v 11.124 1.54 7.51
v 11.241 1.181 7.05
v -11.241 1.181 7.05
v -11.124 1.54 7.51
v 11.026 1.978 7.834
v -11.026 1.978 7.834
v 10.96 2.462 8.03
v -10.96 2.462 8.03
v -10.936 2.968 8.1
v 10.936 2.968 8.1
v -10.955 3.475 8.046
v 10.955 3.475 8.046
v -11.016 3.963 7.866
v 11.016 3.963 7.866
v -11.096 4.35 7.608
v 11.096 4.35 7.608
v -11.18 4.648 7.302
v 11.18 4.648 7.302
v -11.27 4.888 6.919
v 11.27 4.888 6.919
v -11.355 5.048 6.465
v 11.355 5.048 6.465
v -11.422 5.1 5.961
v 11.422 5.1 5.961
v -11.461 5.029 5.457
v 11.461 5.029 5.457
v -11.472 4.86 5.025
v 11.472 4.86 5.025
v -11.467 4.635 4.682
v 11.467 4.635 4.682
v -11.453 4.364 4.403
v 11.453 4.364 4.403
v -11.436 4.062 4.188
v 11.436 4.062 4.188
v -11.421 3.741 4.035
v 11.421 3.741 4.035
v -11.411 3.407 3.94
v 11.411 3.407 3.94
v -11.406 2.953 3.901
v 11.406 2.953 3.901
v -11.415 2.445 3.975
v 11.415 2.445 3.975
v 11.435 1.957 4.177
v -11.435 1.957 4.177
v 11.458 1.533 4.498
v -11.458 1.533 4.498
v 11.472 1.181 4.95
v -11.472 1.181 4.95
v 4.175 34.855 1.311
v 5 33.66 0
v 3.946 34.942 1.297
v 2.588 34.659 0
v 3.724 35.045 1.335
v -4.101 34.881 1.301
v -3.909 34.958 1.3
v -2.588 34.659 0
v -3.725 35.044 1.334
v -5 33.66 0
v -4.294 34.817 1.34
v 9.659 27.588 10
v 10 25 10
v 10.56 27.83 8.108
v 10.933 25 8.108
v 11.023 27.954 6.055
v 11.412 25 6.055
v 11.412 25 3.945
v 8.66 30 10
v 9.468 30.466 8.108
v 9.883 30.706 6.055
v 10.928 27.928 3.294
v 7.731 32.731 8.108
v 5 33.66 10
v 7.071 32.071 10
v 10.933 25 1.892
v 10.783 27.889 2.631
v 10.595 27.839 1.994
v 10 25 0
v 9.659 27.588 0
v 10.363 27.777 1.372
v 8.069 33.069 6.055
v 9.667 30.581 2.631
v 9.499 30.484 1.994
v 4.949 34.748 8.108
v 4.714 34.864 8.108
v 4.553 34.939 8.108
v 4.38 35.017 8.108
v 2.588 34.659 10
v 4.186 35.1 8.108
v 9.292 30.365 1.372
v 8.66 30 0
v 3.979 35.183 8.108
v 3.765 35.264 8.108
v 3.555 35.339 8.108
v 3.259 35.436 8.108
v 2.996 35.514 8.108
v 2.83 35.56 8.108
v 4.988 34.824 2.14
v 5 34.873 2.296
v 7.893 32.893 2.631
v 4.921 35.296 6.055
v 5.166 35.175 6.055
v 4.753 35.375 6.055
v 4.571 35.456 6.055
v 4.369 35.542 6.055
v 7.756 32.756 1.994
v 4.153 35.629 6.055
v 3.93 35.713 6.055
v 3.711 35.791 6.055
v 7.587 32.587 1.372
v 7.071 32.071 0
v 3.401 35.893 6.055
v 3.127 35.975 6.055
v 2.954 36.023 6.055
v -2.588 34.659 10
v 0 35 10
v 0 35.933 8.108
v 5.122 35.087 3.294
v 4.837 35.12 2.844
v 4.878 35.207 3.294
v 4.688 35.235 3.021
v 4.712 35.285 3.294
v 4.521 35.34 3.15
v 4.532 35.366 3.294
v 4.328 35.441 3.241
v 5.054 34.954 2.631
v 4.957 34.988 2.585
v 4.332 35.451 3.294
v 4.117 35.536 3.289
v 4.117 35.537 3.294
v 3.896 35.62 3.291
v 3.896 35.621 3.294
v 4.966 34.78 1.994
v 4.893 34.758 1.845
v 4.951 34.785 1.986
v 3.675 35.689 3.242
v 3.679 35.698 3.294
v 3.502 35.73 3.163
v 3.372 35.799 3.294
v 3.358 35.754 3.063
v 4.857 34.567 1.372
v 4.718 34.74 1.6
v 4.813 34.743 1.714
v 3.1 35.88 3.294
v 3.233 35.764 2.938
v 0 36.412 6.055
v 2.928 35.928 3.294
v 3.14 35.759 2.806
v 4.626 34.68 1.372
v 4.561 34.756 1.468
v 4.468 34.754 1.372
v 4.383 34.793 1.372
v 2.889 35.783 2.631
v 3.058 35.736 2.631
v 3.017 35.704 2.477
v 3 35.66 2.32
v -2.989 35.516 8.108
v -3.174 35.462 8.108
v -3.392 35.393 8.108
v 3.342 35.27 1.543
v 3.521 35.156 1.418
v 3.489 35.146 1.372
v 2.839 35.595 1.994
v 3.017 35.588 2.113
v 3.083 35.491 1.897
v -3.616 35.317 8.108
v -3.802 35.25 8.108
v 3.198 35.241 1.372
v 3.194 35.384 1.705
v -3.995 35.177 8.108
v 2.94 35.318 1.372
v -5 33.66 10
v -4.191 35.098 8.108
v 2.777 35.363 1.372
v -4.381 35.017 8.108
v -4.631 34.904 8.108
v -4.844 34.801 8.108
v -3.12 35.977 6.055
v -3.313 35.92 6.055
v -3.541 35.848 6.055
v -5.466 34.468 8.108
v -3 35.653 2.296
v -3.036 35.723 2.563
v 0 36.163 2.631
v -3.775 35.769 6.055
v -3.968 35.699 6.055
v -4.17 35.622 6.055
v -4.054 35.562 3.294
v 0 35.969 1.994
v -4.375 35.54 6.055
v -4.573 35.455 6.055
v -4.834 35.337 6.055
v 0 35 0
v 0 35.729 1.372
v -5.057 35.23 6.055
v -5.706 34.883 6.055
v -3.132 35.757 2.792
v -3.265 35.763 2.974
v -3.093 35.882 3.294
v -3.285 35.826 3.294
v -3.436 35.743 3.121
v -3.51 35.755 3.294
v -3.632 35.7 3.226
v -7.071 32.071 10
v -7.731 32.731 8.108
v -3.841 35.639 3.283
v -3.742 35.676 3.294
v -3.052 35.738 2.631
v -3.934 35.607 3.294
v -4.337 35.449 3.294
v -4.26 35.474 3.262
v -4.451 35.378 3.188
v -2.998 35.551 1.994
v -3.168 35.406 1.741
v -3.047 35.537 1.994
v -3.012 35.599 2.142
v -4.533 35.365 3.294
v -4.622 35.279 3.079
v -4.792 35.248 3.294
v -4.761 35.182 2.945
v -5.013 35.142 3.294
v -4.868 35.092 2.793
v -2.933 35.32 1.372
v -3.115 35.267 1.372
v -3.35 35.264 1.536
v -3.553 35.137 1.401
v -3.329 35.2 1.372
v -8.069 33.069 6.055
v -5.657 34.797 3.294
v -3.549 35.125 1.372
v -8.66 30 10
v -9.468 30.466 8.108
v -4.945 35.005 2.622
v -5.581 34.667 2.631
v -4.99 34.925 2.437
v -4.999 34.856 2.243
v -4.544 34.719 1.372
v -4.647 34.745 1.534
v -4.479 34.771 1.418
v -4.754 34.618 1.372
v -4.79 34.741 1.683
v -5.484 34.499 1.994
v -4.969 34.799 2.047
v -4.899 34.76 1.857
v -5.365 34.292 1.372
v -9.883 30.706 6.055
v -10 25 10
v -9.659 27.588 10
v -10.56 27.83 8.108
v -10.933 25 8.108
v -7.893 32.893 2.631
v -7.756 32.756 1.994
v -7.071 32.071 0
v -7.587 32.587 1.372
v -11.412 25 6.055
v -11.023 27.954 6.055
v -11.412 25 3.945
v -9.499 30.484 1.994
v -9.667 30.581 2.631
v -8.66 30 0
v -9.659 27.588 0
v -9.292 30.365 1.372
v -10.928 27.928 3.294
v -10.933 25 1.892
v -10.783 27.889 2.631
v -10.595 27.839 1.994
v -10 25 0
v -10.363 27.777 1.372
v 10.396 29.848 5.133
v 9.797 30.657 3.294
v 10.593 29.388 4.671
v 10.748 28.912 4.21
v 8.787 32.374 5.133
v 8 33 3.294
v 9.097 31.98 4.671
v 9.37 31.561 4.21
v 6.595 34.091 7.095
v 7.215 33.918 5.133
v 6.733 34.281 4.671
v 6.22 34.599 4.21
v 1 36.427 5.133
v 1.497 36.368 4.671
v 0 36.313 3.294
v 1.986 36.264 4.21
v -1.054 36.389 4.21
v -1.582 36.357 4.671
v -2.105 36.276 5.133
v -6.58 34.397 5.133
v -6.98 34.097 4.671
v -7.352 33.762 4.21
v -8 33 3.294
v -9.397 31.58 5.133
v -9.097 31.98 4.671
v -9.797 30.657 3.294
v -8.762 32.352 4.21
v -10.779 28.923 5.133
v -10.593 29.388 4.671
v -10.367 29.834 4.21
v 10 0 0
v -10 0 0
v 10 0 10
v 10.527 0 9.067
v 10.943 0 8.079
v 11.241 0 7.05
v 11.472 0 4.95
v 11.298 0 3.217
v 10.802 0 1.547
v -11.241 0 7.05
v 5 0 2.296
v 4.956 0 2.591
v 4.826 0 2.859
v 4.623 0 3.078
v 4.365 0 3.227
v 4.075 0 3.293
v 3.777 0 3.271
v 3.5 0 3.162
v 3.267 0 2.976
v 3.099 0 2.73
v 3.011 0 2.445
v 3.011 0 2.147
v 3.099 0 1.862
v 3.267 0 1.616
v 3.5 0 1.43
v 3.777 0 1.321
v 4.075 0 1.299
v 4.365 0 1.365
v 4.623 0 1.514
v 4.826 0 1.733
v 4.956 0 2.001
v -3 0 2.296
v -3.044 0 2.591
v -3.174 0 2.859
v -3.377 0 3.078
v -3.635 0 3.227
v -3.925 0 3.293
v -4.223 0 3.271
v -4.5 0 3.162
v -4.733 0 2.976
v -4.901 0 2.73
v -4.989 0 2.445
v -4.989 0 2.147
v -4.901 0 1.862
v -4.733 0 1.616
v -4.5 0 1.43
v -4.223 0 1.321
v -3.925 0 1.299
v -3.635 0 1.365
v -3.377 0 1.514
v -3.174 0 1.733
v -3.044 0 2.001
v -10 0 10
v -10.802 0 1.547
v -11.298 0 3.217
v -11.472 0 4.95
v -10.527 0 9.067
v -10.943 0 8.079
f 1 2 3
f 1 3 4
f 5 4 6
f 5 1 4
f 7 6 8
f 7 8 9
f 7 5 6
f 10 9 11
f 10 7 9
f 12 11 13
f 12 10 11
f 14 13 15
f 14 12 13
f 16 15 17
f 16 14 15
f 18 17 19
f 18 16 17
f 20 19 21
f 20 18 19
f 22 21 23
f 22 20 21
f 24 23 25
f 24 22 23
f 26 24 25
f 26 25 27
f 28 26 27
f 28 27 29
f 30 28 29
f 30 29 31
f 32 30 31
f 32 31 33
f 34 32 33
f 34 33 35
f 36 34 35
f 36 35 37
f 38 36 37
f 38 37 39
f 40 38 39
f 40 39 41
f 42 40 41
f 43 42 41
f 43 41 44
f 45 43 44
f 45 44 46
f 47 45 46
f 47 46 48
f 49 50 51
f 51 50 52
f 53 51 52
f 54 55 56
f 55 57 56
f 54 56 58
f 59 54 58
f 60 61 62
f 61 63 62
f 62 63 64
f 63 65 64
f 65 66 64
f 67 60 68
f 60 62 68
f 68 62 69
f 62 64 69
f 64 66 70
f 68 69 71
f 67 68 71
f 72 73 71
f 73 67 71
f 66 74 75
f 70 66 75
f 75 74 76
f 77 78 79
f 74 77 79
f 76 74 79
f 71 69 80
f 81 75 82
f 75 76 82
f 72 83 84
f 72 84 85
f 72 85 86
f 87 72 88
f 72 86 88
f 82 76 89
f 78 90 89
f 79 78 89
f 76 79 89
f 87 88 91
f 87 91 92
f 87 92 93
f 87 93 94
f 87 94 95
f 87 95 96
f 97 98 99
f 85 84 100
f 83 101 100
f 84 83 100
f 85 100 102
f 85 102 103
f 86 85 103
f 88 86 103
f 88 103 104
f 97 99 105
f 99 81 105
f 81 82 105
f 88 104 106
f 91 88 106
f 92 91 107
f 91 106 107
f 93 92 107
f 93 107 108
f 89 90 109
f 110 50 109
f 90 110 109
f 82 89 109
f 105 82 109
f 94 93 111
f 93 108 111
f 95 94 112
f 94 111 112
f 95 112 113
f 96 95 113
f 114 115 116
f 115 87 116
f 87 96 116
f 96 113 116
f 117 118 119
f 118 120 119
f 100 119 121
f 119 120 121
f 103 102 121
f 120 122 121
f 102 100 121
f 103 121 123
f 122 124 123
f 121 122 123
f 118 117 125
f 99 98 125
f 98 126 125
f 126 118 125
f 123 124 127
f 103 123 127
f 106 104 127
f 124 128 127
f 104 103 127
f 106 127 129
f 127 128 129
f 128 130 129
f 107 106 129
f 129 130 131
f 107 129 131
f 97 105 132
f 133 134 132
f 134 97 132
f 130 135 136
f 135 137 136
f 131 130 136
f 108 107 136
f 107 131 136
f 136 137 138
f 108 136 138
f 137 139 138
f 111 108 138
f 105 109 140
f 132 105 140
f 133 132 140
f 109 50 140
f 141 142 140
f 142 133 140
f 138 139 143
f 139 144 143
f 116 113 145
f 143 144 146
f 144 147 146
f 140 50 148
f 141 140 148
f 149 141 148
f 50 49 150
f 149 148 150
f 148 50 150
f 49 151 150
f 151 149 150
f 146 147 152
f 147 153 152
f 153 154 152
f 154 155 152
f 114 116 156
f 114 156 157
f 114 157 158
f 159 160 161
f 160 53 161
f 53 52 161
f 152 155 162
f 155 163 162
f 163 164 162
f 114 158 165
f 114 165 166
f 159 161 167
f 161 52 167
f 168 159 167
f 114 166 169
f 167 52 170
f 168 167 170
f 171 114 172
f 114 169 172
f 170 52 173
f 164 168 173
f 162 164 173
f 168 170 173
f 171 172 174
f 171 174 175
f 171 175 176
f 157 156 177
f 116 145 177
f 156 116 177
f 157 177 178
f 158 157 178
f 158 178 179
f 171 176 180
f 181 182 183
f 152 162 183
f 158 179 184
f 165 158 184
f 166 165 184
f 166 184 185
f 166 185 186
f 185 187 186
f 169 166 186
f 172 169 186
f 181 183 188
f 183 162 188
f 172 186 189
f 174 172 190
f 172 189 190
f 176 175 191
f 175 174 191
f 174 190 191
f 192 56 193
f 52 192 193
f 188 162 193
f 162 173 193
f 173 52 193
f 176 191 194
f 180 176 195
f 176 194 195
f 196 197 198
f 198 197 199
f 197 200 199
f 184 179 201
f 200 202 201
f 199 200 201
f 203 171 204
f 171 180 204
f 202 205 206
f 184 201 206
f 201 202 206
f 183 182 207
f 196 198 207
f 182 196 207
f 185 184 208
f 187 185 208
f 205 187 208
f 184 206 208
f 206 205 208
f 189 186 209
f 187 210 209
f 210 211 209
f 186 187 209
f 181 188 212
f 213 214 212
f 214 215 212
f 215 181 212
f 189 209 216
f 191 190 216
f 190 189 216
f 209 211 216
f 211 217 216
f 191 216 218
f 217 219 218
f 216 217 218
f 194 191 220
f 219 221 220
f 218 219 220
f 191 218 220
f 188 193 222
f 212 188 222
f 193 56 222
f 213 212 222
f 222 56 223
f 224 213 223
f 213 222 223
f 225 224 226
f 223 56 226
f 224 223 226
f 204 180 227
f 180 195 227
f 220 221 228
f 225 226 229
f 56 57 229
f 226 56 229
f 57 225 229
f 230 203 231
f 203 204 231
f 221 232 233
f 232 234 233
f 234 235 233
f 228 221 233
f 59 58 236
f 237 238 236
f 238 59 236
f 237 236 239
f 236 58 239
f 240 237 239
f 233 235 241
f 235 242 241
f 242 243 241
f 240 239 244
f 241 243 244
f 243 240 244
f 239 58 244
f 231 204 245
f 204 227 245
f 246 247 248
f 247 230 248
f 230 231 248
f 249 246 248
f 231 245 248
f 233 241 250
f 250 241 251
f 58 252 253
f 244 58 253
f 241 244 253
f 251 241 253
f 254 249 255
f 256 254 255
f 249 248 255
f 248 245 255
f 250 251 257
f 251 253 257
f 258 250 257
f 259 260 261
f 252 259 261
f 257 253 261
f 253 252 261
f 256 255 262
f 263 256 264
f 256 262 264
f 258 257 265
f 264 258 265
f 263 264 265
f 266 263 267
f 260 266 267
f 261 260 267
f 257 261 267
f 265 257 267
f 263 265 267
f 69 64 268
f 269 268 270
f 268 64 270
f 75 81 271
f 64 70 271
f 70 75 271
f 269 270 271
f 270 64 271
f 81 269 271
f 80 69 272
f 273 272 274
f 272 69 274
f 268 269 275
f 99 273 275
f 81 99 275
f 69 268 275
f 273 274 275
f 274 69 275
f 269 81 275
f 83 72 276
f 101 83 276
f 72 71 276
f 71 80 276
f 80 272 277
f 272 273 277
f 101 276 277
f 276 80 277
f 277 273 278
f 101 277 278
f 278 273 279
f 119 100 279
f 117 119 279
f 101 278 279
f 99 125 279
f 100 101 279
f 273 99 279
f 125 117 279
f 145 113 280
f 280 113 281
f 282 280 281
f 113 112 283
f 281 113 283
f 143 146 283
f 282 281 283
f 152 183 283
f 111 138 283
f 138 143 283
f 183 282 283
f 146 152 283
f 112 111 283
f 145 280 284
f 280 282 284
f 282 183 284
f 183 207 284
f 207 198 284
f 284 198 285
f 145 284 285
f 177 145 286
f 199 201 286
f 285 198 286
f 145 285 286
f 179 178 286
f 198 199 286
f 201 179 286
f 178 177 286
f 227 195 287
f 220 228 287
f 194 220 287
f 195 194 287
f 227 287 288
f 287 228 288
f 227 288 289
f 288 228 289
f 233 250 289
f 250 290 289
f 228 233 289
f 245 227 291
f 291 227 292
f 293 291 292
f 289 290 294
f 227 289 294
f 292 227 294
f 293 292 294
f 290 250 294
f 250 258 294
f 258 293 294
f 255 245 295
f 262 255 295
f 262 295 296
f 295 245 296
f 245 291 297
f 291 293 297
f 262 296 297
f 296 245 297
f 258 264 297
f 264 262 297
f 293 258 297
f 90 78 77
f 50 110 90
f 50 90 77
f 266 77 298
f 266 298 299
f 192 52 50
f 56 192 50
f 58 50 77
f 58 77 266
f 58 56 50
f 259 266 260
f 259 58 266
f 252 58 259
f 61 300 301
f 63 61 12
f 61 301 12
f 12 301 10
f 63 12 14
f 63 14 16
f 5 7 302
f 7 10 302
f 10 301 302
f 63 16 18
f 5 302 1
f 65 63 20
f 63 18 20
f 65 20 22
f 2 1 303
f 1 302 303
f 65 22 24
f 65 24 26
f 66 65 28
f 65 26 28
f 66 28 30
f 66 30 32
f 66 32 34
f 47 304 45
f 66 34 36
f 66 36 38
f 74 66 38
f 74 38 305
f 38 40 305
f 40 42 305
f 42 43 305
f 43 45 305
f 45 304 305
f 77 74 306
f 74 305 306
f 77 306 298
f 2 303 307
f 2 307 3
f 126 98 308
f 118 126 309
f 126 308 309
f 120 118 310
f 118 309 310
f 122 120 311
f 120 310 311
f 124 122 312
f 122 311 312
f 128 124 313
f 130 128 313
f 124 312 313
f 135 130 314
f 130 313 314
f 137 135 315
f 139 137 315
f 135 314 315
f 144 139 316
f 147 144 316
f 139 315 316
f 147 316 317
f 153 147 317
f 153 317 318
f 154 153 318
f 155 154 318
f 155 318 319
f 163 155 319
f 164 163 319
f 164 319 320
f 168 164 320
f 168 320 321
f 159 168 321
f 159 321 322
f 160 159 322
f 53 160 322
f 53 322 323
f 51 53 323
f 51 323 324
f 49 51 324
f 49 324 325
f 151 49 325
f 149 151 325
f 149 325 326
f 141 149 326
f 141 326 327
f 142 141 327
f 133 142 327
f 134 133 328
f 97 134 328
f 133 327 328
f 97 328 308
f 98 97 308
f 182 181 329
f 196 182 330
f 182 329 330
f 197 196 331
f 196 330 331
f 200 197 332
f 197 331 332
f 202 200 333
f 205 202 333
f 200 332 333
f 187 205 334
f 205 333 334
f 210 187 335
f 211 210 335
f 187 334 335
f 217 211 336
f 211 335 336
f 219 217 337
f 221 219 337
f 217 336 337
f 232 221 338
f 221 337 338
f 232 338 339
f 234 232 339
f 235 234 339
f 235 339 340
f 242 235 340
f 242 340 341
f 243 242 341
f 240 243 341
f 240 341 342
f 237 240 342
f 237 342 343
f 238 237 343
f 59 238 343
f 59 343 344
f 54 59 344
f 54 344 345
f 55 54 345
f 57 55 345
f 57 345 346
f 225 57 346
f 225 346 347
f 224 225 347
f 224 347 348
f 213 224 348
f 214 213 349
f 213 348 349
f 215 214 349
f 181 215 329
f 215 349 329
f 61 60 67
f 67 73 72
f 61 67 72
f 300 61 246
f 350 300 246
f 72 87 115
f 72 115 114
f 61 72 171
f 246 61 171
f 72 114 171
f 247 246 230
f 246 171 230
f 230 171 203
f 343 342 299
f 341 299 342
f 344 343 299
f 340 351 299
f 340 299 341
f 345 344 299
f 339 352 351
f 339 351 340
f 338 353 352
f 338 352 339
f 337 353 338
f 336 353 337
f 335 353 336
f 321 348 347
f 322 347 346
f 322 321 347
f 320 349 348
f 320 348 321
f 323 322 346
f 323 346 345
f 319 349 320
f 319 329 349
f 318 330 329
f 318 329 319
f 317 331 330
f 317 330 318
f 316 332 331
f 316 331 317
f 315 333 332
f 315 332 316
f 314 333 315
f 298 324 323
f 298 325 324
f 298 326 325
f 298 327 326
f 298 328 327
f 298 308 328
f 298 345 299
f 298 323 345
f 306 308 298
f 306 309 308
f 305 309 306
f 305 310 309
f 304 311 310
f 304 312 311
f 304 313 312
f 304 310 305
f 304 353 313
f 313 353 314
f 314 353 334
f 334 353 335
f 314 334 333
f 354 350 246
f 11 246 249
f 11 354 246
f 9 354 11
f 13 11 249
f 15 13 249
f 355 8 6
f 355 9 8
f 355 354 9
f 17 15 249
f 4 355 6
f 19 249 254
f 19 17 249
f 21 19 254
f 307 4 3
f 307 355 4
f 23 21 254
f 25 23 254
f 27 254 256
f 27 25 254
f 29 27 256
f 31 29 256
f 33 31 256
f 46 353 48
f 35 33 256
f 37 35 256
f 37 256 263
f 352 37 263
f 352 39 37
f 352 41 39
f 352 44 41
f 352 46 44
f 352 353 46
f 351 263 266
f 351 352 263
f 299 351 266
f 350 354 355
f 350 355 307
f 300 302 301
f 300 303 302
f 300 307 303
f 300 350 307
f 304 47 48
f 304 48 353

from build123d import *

# Parameters (mm, degrees)
BOSS_EXTRUDE1_DEPTH      = 10
BOSS_EXTRUDE2_DEPTH      = 25
SKETCH11_R               = 1
CUT_EXTRUDE9_DEPTH       = 40.519896768
CUT_EXTRUDE16_DEPTH      = 14.1
CUT_EXTRUDE16_DEPTH_BACK = 14.1


with BuildPart() as part:
    # Sketch1 → Boss-Extrude1 (new body)
    with BuildSketch(Plane.XY):
        with BuildLine():
            Line((10, 0), (-10, 0))
            Line((-10, 0), (-10, 25))
            ThreePointArc((-10, 25), (0, 35), (10, 25))
            Line((10, 25), (10, 0))
        make_face()
    extrude(amount=BOSS_EXTRUDE1_DEPTH)

    # Sketch16 → Boss-Extrude2 (add)
    with BuildSketch(Plane.XZ):
        with BuildLine():
            Line((-10, 0), (-10, 10))
            ThreePointArc((-10, 10), (-11.472090345, 5), (-10, 0))
        make_face()
        with BuildLine():
            Line((10, 0), (10, 10))
            ThreePointArc((10, 10), (11.472090345, 5), (10, 0))
        make_face()
    extrude(amount=-BOSS_EXTRUDE2_DEPTH)

    # Sketch18 → Revolve1 (revolve)
    with BuildSketch(Plane(origin=(0, 25, 0), x_dir=(1, 0, 0), z_dir=(0, 1, 0))):
        with BuildLine():
            Line((10, 0), (10, -10))
            ThreePointArc((10, -10), (11.472090345, -5), (10, 0))
        make_face()
    revolve(axis=Axis((0, 25, 0), (0, 0, 1)))

    # Sketch11 → Cut-Extrude9 (cut, through all)
    with BuildSketch(Plane.XZ):
        with Locations((4, 2.295920755)):
            Circle(SKETCH11_R)
        with Locations((-4, 2.295920755)):
            Circle(SKETCH11_R)
    extrude(amount=-CUT_EXTRUDE9_DEPTH, mode=Mode.SUBTRACT)

    # Sketch14 → Cut-Extrude16 (cut, two sides: drawn at the far end of the back side and taken through both)
    with BuildSketch(Plane.ZY.offset(-CUT_EXTRUDE16_DEPTH_BACK)):
        with BuildLine():
            Line((4.95, 1.181346652), (4.95, 0))
            Line((4.95, 0), (7.05, 0))
            Line((7.05, 0), (7.05, 1.181346652))
            ThreePointArc((7.05, 1.181346652), (6, 5.1), (4.95, 1.181346652))
        make_face()
    extrude(amount=CUT_EXTRUDE16_DEPTH + CUT_EXTRUDE16_DEPTH_BACK, mode=Mode.SUBTRACT)


solid = part.part
